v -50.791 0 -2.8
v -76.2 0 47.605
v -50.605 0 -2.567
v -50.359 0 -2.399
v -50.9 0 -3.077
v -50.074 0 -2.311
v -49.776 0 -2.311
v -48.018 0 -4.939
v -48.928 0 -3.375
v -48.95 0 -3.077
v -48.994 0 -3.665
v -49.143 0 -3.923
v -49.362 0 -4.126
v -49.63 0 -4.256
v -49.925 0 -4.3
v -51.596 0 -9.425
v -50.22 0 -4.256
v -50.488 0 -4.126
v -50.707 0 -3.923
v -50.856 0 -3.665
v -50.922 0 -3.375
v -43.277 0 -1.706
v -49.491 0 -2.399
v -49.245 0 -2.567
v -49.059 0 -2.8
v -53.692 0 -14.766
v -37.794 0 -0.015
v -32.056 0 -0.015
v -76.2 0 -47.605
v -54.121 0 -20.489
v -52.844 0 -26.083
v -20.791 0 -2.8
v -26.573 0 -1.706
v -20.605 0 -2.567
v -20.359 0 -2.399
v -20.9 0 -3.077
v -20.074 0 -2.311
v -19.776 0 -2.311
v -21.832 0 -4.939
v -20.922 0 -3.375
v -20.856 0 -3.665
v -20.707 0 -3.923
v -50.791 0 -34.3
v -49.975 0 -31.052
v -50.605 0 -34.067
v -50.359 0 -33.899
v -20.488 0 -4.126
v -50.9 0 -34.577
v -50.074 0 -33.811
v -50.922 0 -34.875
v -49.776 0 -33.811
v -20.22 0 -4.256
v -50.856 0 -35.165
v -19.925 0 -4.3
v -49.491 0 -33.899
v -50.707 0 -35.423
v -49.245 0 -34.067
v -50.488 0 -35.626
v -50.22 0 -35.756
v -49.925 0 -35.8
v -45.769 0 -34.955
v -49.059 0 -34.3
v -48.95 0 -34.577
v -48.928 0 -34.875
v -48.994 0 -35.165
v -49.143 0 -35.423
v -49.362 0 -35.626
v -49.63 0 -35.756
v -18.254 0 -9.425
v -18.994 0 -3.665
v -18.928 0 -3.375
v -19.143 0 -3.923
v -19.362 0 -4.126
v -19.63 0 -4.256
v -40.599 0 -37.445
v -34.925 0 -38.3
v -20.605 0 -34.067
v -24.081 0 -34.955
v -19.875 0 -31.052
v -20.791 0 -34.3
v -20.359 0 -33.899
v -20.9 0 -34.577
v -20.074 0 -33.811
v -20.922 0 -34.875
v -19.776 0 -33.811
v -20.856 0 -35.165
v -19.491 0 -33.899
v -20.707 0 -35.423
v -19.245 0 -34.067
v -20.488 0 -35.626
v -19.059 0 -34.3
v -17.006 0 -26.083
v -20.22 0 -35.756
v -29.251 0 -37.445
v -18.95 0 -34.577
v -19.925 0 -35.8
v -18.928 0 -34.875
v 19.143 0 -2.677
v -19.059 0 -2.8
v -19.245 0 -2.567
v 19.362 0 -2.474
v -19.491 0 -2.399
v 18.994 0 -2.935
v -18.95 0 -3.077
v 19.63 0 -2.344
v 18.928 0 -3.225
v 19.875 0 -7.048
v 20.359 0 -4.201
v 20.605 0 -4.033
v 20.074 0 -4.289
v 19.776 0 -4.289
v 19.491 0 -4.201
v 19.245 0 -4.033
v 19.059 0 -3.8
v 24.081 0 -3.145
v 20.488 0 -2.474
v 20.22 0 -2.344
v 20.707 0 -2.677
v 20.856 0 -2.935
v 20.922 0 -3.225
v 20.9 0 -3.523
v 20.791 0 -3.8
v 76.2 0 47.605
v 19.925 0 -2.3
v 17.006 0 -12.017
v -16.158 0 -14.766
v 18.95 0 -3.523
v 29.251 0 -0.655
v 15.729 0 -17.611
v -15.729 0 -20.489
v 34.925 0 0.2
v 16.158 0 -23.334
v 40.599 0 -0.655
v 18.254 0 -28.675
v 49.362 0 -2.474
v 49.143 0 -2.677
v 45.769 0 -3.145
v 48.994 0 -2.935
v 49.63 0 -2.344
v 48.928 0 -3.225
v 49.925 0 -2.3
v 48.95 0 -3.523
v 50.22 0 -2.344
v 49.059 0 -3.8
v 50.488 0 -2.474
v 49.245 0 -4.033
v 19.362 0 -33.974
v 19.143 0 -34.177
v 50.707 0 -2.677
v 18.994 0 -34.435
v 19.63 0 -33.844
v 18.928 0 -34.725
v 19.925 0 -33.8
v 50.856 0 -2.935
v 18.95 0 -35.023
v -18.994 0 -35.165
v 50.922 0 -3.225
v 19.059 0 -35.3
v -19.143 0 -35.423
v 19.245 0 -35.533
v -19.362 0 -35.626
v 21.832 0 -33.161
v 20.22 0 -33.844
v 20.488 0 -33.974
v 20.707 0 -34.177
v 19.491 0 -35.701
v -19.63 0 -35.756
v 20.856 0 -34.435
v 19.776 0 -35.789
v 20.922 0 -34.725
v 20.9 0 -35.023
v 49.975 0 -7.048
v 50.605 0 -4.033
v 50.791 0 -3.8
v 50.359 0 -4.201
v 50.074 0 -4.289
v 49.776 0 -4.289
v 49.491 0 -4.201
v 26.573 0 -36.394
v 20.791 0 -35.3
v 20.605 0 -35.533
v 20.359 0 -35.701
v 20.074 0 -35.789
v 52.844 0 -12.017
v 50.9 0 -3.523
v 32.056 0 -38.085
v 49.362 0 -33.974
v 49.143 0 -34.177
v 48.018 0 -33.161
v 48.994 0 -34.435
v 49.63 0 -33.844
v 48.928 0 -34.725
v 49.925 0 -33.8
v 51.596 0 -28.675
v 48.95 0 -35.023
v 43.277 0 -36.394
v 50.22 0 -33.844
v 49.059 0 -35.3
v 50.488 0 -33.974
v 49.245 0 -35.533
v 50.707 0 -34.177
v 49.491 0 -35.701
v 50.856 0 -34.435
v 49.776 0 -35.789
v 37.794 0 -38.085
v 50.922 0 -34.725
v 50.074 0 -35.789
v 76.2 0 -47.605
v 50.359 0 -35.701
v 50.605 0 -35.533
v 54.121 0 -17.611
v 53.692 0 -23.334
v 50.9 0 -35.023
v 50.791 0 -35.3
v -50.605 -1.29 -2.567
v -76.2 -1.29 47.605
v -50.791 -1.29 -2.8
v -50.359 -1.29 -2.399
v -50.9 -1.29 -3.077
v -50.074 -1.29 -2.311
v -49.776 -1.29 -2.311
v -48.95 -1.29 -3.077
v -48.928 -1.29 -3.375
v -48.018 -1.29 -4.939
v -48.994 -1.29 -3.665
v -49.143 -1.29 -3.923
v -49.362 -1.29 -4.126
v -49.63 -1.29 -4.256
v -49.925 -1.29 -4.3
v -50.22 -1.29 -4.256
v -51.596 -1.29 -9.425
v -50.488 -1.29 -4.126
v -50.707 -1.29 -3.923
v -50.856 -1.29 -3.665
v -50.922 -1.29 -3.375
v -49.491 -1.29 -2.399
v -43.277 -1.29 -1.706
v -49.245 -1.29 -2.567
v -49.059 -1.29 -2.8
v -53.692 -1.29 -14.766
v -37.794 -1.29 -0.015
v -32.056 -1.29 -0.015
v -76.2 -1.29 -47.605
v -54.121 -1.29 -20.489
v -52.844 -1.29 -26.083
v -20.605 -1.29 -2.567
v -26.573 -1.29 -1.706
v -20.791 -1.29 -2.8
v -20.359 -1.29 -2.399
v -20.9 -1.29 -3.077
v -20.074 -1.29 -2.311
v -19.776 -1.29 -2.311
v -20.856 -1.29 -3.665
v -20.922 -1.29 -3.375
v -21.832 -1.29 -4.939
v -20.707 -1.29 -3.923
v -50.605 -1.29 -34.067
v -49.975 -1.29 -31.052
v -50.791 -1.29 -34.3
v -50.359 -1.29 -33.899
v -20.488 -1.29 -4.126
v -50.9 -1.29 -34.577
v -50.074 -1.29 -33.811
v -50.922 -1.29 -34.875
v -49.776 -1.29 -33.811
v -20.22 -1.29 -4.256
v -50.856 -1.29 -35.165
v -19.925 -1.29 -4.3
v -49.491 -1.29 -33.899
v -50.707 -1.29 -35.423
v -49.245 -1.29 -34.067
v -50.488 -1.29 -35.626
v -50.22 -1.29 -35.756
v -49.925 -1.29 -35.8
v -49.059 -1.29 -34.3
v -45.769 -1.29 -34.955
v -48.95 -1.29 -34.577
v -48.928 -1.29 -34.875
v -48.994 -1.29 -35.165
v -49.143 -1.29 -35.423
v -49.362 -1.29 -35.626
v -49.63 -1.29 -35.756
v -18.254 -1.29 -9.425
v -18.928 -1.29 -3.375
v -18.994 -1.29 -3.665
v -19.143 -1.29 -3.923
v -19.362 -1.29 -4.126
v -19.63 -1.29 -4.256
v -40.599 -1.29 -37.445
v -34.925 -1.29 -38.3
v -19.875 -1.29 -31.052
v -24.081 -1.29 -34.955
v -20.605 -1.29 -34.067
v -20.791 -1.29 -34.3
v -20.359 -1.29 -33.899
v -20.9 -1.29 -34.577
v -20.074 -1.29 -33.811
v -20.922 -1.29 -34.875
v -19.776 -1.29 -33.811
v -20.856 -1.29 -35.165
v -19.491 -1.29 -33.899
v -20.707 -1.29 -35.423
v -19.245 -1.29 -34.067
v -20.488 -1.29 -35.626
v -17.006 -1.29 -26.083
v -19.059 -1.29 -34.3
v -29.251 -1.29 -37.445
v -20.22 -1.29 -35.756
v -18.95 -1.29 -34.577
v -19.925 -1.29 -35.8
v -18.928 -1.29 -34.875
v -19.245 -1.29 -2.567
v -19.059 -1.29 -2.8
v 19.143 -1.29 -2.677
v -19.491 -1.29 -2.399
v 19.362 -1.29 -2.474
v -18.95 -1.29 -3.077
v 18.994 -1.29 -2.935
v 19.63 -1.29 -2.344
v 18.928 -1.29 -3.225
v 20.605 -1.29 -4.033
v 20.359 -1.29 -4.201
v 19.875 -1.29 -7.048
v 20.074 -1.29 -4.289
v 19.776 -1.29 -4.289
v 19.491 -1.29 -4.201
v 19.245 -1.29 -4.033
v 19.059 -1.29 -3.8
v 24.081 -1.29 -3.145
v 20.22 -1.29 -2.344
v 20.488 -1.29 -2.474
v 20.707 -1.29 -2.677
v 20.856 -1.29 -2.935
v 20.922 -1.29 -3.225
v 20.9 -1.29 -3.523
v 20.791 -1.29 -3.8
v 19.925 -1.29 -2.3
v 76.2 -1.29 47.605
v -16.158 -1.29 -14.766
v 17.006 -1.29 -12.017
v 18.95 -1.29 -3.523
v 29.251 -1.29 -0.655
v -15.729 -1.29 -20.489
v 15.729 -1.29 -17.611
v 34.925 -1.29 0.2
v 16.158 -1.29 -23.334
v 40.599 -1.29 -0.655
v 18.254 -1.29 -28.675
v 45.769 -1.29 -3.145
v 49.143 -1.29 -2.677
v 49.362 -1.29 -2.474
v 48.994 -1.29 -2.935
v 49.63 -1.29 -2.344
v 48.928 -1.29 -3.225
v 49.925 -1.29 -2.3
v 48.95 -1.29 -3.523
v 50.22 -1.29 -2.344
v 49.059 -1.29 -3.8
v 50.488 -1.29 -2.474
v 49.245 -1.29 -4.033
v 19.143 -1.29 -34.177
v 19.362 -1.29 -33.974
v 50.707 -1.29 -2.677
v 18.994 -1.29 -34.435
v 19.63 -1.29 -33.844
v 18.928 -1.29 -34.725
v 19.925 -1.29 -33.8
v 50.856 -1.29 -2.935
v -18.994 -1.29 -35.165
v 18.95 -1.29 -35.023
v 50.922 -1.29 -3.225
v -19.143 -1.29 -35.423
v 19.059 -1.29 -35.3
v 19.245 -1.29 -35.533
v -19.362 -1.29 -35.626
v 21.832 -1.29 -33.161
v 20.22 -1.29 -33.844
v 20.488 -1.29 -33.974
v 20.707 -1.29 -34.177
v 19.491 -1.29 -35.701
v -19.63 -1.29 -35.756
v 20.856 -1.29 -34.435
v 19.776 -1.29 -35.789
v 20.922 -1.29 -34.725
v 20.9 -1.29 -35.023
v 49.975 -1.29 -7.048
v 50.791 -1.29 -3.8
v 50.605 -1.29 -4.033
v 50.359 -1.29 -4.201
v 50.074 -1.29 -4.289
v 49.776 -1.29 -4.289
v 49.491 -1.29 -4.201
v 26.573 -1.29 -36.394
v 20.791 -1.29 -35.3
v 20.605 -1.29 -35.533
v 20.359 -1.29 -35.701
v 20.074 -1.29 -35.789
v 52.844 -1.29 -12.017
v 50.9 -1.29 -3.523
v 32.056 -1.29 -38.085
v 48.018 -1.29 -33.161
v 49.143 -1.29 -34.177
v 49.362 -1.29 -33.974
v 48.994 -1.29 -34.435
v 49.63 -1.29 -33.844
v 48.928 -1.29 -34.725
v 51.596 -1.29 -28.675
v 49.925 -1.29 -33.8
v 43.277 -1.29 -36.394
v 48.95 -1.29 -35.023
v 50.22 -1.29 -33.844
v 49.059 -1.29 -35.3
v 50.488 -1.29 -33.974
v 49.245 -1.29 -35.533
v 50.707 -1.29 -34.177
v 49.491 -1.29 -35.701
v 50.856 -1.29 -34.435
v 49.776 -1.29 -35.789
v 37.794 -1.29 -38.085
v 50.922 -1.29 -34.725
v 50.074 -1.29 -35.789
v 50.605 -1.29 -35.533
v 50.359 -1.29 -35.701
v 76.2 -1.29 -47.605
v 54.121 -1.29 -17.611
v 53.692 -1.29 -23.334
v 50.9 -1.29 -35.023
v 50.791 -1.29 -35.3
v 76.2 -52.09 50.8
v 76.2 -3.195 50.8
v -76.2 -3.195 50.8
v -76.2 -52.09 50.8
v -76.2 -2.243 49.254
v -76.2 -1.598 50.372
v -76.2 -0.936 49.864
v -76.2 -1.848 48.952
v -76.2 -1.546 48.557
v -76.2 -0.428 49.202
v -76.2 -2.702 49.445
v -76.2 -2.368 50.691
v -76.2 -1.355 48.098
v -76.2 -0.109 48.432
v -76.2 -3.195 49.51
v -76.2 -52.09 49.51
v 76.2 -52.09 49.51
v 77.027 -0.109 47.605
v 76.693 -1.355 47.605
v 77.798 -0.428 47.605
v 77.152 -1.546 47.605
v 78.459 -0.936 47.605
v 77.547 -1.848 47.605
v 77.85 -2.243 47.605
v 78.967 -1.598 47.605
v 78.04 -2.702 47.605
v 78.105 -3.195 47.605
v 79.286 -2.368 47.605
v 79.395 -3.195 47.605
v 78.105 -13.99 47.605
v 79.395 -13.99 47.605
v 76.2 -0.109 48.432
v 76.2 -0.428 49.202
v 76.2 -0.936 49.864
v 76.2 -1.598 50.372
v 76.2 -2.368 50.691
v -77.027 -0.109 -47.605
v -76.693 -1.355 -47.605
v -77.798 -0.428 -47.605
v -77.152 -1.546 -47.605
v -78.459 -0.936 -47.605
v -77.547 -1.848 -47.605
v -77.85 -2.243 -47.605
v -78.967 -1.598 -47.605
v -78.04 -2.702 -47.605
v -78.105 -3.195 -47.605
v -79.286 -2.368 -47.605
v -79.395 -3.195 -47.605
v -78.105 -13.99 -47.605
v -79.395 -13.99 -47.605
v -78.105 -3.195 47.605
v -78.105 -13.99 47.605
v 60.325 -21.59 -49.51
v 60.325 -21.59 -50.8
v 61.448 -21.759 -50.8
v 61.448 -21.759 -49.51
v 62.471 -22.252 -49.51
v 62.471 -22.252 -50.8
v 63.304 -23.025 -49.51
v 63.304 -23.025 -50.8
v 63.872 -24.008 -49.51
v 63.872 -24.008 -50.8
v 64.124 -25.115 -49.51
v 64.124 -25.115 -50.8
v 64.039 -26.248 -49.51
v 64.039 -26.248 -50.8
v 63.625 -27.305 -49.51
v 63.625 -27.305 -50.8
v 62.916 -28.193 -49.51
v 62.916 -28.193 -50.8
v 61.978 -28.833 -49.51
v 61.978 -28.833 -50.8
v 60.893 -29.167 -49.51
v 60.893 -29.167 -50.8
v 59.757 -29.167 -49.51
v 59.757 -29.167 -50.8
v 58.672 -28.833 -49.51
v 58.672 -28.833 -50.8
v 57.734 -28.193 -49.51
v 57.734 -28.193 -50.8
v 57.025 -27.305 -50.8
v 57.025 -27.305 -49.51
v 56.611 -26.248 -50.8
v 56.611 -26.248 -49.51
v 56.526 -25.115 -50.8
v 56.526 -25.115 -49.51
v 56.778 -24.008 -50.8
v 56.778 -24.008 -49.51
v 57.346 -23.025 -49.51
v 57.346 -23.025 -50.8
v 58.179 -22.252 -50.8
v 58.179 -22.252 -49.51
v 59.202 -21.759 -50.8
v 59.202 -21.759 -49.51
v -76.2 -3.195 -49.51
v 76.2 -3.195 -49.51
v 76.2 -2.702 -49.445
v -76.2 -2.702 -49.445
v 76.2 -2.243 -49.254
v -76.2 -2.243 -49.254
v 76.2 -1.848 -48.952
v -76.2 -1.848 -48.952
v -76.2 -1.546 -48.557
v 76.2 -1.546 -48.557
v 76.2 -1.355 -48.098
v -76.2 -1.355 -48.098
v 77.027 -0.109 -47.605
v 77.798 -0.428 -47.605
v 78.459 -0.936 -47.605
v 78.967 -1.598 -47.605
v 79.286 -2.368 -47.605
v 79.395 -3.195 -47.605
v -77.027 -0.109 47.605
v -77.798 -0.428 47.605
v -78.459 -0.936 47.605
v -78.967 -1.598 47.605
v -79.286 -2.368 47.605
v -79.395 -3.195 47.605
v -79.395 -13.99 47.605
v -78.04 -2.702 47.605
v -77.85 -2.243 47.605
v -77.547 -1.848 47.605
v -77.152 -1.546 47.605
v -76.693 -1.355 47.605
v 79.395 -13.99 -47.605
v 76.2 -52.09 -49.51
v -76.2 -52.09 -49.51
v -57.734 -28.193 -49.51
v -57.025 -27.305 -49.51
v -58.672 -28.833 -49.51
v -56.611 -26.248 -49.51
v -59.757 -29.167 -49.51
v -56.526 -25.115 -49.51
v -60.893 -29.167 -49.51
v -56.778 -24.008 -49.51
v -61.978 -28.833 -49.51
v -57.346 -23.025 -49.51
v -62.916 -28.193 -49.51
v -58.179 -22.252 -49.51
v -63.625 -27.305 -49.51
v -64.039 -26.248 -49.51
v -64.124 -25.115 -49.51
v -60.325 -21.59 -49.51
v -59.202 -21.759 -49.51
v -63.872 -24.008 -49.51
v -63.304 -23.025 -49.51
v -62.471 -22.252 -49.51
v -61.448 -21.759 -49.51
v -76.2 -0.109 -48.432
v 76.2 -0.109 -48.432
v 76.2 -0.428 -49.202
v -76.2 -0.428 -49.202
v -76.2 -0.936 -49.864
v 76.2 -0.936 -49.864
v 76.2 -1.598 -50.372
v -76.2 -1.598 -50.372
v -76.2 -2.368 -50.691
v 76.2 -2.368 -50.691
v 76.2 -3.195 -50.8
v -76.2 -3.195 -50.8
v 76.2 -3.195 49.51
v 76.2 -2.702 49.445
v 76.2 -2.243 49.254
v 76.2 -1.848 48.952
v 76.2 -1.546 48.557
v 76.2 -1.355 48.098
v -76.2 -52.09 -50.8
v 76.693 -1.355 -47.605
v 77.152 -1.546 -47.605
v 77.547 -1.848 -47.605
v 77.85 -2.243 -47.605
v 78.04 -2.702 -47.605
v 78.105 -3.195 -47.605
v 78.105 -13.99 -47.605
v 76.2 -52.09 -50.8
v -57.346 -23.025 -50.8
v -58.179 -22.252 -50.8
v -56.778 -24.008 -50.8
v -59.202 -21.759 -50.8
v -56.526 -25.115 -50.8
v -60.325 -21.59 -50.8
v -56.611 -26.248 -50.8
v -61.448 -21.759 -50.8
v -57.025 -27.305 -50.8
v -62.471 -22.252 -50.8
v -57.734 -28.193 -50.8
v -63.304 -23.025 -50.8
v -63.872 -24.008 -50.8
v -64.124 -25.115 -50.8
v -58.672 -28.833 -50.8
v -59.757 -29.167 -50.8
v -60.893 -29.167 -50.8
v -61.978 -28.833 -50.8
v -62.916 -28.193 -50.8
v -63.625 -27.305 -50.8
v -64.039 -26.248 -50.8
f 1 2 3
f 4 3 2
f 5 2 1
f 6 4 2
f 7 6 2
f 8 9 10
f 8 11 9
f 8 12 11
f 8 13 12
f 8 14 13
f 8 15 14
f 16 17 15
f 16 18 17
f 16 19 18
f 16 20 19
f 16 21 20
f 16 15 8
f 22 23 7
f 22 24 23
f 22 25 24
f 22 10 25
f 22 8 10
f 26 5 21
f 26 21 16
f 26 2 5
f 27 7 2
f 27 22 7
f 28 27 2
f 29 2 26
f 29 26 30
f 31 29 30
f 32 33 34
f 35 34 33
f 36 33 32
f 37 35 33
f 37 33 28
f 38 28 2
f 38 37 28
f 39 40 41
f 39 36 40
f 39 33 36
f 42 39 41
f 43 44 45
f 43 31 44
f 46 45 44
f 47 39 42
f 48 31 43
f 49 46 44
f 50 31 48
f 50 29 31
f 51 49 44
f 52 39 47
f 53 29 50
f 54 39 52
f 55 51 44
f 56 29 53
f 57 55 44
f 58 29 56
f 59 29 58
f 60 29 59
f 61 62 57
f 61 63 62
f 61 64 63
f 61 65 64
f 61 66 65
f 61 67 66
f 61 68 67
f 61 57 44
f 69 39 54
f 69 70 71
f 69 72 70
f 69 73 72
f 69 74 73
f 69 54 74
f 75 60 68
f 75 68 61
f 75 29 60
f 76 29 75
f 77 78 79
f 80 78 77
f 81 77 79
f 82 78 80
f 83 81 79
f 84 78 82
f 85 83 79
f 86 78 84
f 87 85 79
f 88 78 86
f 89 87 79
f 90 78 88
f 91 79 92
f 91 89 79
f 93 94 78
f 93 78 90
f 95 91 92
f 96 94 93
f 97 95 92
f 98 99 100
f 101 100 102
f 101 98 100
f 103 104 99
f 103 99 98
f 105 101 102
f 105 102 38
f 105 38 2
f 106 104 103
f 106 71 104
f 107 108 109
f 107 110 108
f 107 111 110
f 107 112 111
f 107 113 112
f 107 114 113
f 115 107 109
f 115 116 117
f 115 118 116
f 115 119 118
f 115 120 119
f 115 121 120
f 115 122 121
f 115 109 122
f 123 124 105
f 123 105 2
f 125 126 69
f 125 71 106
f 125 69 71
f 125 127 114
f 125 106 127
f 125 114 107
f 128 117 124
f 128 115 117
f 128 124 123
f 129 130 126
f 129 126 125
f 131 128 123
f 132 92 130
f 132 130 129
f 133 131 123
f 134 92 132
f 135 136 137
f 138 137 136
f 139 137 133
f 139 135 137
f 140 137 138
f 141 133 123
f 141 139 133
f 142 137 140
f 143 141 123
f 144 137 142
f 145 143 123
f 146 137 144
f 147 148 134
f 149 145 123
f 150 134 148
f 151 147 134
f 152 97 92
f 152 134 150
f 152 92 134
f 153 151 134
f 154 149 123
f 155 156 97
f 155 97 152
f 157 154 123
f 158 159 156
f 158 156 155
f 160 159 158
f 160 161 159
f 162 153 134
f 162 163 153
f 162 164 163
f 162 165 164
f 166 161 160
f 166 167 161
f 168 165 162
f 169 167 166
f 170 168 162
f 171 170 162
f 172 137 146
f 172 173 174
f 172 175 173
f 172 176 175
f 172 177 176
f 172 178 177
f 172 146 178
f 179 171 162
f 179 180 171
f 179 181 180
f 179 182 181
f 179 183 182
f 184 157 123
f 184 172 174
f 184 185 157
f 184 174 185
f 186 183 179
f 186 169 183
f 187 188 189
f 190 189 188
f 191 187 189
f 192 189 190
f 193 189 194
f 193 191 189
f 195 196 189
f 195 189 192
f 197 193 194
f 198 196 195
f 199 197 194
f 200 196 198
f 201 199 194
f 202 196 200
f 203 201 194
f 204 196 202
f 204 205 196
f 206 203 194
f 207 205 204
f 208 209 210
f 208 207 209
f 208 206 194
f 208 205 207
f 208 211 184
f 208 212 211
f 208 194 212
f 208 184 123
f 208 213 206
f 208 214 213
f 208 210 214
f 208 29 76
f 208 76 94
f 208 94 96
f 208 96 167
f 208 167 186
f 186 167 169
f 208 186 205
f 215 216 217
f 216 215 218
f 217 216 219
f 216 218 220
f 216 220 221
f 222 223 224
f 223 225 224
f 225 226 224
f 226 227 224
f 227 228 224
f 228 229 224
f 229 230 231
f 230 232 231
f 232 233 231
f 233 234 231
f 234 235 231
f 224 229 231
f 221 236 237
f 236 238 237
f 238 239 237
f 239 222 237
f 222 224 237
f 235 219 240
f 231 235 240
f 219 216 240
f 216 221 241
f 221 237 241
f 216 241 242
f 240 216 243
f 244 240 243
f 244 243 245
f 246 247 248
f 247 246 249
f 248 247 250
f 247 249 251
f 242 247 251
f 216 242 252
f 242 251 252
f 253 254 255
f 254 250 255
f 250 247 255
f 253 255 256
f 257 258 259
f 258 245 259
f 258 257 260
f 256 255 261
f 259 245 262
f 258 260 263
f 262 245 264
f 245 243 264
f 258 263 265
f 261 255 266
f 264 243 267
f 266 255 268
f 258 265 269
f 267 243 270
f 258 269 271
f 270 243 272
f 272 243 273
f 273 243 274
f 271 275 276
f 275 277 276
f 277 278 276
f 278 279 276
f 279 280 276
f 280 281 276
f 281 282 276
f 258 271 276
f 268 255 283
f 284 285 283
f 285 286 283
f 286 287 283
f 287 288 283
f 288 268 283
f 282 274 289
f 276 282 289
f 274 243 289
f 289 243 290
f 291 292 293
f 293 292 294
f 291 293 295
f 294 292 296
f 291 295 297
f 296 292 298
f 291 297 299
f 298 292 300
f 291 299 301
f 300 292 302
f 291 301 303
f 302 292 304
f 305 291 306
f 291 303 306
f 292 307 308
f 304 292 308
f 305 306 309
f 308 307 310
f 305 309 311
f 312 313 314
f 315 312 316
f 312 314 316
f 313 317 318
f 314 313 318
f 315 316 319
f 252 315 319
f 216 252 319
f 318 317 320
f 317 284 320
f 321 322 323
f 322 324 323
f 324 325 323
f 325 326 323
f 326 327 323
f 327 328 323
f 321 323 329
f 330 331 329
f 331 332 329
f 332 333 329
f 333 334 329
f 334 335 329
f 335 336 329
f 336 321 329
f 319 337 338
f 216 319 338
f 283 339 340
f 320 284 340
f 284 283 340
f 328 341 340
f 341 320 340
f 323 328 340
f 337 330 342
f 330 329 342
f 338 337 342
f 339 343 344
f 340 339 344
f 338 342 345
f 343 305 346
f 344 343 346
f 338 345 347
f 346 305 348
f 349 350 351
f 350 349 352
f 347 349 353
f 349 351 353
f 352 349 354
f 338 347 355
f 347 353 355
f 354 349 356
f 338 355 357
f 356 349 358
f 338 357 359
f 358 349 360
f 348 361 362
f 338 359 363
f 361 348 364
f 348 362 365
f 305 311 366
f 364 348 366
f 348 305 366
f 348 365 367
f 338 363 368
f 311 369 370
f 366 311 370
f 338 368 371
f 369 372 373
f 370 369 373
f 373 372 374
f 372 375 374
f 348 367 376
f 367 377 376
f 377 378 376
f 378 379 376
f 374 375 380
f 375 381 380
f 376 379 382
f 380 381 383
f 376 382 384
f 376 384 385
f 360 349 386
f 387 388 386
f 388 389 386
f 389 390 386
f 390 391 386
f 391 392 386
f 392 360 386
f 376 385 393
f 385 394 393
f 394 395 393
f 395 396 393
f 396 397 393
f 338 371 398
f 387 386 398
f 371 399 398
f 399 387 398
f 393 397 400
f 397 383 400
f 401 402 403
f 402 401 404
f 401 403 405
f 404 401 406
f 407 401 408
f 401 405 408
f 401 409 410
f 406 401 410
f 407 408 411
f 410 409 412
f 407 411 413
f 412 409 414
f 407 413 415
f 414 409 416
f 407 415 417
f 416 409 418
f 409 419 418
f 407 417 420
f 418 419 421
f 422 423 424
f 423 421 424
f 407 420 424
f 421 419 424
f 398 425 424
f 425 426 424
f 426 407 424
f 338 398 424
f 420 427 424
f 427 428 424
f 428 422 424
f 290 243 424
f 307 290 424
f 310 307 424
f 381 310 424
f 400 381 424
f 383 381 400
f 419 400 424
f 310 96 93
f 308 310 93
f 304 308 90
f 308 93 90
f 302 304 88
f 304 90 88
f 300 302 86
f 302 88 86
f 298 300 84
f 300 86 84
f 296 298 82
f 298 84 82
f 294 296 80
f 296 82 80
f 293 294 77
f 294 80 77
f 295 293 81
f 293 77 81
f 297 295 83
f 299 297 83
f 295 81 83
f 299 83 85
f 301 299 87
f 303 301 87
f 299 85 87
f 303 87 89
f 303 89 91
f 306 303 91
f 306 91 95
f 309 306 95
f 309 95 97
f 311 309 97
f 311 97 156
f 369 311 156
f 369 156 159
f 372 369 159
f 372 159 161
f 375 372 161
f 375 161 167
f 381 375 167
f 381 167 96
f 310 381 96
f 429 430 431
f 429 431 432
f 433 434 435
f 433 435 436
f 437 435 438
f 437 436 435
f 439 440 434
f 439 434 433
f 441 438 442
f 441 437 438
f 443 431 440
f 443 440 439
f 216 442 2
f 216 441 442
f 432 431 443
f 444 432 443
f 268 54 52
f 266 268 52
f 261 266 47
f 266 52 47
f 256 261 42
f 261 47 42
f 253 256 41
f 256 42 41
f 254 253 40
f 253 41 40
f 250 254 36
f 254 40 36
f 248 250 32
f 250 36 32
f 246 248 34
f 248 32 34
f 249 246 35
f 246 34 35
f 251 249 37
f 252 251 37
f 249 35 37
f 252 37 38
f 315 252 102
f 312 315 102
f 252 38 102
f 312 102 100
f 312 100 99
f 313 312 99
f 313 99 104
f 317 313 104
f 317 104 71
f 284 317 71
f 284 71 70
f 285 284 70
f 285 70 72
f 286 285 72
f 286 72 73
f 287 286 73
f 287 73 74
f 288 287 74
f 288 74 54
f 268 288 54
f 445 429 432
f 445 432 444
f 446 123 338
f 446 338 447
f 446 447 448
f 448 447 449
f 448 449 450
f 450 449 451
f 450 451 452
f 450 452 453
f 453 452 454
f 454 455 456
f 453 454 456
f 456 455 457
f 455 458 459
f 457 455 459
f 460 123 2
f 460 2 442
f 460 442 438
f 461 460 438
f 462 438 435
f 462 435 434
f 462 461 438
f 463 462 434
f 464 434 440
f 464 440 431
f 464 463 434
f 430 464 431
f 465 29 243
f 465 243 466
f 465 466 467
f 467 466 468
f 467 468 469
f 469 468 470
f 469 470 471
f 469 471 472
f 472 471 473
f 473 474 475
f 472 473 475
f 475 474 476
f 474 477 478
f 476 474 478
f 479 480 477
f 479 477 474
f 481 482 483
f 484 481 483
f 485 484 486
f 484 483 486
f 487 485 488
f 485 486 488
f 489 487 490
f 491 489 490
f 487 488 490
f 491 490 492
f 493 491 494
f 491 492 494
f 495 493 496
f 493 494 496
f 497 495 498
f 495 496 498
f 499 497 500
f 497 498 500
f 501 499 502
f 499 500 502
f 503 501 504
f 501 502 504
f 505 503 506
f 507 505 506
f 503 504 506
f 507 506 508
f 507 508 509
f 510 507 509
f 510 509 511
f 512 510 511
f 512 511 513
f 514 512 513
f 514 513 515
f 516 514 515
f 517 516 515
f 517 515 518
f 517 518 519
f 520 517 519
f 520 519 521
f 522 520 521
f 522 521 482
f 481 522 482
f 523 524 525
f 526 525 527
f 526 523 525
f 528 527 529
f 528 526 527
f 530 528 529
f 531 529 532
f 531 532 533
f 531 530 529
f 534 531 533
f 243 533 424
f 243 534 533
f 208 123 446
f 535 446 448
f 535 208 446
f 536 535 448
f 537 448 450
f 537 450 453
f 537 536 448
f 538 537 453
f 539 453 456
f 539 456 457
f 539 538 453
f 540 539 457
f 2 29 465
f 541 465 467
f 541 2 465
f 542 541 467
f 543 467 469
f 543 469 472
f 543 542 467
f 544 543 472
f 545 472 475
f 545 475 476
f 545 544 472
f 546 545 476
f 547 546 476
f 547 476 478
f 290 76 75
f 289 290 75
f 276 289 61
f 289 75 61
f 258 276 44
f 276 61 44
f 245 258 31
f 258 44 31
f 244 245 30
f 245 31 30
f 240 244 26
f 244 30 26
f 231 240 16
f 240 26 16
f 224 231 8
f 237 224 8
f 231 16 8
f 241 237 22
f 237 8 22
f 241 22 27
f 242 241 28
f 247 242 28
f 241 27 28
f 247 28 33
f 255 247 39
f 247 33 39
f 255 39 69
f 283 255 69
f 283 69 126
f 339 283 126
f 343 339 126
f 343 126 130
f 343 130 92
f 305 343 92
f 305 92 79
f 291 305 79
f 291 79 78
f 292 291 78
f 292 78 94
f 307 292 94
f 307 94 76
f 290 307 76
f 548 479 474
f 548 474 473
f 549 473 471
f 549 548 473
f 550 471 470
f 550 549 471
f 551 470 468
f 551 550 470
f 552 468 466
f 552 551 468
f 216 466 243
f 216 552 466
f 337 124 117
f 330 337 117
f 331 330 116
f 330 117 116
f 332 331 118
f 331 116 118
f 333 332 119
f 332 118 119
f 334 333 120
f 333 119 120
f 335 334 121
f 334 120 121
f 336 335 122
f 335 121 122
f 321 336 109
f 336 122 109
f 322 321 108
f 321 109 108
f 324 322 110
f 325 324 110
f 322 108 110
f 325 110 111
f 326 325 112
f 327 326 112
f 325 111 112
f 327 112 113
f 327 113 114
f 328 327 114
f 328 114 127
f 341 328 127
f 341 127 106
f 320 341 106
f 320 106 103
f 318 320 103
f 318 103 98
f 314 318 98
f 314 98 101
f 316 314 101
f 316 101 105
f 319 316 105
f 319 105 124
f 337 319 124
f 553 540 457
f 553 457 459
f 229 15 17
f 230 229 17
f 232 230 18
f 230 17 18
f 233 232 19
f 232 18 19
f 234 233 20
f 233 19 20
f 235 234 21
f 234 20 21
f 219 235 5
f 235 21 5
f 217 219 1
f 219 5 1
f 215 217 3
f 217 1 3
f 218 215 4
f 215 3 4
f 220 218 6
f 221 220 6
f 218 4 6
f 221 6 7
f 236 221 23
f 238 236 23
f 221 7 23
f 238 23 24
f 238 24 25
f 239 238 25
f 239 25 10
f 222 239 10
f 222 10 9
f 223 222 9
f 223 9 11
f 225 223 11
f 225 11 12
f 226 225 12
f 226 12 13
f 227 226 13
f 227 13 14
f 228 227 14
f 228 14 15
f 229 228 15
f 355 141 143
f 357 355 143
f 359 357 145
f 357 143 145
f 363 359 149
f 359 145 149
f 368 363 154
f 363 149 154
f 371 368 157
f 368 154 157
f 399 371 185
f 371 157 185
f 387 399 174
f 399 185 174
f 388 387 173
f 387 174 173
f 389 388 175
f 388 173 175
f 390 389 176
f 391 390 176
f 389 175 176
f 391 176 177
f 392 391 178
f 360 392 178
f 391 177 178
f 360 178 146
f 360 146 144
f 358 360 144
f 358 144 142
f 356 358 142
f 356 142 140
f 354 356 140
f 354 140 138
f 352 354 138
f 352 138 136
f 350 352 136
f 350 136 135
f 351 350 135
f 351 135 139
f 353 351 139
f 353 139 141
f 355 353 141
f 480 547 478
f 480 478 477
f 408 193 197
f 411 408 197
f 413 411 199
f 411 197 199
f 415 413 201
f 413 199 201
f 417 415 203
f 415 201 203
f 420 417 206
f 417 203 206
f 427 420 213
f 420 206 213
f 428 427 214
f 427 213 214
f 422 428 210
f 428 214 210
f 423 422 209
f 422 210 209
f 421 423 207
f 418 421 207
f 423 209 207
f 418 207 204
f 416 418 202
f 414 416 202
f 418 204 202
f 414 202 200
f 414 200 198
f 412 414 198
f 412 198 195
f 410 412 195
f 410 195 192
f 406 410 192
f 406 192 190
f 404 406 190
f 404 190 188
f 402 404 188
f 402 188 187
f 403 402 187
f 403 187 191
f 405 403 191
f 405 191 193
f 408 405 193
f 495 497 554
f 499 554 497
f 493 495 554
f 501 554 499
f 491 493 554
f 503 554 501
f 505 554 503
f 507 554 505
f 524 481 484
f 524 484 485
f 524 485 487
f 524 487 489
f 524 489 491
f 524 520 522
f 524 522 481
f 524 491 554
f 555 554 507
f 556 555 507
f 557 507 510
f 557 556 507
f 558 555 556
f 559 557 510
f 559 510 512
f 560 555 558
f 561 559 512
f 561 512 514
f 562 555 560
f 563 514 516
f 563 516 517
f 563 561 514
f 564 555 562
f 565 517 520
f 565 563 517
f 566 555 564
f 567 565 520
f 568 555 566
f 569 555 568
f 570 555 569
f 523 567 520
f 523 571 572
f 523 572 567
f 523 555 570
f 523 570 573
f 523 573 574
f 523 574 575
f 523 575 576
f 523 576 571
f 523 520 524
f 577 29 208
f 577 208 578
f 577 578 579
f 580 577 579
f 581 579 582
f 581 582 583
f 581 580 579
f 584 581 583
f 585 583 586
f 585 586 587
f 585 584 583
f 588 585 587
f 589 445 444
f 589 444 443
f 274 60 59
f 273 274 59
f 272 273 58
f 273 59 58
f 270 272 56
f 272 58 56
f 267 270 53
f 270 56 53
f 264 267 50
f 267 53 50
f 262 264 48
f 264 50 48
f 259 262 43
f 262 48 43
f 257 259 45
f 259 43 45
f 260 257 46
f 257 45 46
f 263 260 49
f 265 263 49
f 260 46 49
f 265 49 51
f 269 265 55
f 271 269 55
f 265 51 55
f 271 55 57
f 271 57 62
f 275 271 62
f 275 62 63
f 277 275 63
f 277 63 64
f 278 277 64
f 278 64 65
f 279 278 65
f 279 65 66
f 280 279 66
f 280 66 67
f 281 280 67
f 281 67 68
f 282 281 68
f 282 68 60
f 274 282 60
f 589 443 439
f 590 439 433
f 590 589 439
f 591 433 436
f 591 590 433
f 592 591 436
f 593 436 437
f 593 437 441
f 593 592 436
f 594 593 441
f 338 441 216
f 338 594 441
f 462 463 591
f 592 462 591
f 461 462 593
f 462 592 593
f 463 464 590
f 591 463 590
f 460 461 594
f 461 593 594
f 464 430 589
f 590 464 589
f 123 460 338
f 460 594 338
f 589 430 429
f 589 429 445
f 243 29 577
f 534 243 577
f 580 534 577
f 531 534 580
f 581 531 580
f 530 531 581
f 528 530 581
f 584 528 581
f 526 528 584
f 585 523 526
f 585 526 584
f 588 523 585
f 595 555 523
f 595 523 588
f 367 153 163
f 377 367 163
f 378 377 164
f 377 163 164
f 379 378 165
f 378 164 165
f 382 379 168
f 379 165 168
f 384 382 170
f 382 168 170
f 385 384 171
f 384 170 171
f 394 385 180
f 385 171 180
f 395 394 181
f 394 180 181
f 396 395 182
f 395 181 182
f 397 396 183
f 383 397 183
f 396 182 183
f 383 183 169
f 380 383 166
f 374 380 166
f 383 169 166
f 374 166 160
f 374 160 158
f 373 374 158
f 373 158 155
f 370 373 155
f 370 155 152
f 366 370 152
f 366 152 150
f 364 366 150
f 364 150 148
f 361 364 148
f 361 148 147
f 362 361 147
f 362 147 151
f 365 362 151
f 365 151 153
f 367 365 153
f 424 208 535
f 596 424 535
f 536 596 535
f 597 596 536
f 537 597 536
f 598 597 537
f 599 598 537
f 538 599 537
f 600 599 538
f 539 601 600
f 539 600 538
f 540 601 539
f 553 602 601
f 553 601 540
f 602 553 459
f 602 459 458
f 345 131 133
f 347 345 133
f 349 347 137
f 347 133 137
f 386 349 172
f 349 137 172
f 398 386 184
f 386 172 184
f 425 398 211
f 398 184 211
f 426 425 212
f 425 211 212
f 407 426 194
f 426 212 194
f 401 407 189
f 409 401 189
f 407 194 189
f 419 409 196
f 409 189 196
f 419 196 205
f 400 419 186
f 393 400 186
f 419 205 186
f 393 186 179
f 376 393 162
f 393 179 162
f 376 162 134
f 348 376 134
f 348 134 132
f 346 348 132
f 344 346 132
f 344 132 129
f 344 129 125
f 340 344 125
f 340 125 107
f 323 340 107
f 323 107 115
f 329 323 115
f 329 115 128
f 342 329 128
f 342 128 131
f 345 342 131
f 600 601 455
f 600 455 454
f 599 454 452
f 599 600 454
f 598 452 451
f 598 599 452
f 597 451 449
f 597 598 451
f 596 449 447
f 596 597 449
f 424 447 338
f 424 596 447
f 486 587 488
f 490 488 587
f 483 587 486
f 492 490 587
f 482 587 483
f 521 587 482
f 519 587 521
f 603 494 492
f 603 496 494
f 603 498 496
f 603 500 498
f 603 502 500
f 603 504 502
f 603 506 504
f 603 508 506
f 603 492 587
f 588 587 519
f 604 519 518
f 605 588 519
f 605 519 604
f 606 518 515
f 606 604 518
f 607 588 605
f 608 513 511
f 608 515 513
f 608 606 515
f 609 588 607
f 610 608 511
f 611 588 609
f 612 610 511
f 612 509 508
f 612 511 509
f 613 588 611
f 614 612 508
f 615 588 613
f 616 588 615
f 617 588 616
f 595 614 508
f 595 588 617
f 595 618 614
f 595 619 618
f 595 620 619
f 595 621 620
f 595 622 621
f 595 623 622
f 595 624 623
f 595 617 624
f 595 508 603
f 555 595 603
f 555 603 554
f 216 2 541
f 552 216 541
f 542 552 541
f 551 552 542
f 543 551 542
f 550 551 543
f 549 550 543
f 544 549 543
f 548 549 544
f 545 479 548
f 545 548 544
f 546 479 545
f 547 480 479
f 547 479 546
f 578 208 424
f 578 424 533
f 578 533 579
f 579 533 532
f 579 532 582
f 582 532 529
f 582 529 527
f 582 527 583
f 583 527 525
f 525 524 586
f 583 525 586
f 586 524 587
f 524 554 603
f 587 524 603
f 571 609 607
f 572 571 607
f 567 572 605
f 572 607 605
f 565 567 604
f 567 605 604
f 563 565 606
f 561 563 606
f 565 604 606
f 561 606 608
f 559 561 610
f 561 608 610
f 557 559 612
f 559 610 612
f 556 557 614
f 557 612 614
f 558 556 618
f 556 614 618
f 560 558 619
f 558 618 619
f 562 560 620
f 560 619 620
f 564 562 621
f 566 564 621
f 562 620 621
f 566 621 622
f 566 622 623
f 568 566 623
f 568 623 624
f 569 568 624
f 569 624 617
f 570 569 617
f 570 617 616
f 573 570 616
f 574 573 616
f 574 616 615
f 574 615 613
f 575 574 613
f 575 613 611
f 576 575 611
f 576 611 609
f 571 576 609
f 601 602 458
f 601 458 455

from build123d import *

# Parameters (mm, degrees)
SKETCH1_W                      = 152.4
SKETCH1_H                      = 101.6
BASE_FLANGE1_DEPTH             = 1.29032
EDGE_FLANGE1_STRIP_W           = 8.97128
EDGE_FLANGE1_STRIP_H           = 1.29032
EDGE_FLANGE1_STRIP_CUT_DEPTH   = 152.4
EDGE_FLANGE1_STRIP_2_W         = 8.97128
EDGE_FLANGE1_STRIP_2_H         = 1.29032
EDGE_FLANGE1_STRIP_CUT_2_DEPTH = 152.4
EDGE_FLANGE1_DEPTH             = 152.4
EDGE_FLANGE1_BEND_DEPTH        = 152.4
EDGE_FLANGE2_DEPTH             = 95.20936
EDGE_FLANGE2_BEND_DEPTH        = 95.20936
SKETCH22_R                     = 19.249999981
SKETCH22_R_2                   = 1
CUT_EXTRUDE1_DEPTH             = 2.54
CUT_EXTRUDE2_REACH             = 141.067
SKETCH23_R                     = 3.81


# Sheet-metal steps are written as plain solids
with BuildPart() as part:
    # Sketch1 → Base-Flange1 (new body)
    with BuildSketch(Plane(origin=(0, 0, 0), x_dir=(1, 0, 0), z_dir=(0, 1, 0))):
        Rectangle(SKETCH1_W, SKETCH1_H)
    extrude(amount=-BASE_FLANGE1_DEPTH)

    # Edge-Flange1 strip (across the edge) → Edge-Flange1 strip cut (cut)
    with BuildSketch(Plane(origin=(76.2, -1.29032, 50.8), x_dir=(0, 0, -1), z_dir=(-1, 0, 0))):
        with Locations((-1.29032, -0.64516)):
            Rectangle(EDGE_FLANGE1_STRIP_W, EDGE_FLANGE1_STRIP_H)
    extrude(amount=EDGE_FLANGE1_STRIP_CUT_DEPTH, mode=Mode.SUBTRACT)

    # Edge-Flange1 strip 2 (across the edge) → Edge-Flange1 strip cut 2 (cut)
    with BuildSketch(Plane(origin=(-76.2, -1.29032, -50.8), x_dir=(0, 0, 1), z_dir=(1, 0, 0))):
        with Locations((-1.29032, -0.64516)):
            Rectangle(EDGE_FLANGE1_STRIP_2_W, EDGE_FLANGE1_STRIP_2_H)
    extrude(amount=EDGE_FLANGE1_STRIP_CUT_2_DEPTH, mode=Mode.SUBTRACT)

    # Edge-Flange1 section (across the edge) → Edge-Flange1 (add)
    with BuildSketch(Plane(origin=(76.2, -1.29032, 50.8), x_dir=(0, 0, -1), z_dir=(-1, 0, 0))):
        with BuildLine():
            Line((0, 1.905), (0, 50.8))
            Line((0, 50.8), (1.29032, 50.8))
            Line((1.29032, 50.8), (1.29032, 1.905))
            ThreePointArc((1.29032, 1.905), (1.848281582, 0.557961582), (3.19532, 0))
            Line((3.19532, 0), (3.19532, -1.29032))
            ThreePointArc((3.19532, -1.29032), (0.93588756, -0.35443244), (0, 1.905))
        make_face()
    extrude(amount=EDGE_FLANGE1_DEPTH)

    # Edge-Flange1 section 2 (across the edge) → Edge-Flange1 bend (add)
    with BuildSketch(Plane(origin=(-76.2, -1.29032, -50.8), x_dir=(0, 0, 1), z_dir=(1, 0, 0))):
        with BuildLine():
            Line((0, 1.905), (0, 50.8))
            Line((0, 50.8), (1.29032, 50.8))
            Line((1.29032, 50.8), (1.29032, 1.905))
            ThreePointArc((1.29032, 1.905), (1.848281582, 0.557961582), (3.19532, 0))
            Line((3.19532, 0), (3.19532, -1.29032))
            ThreePointArc((3.19532, -1.29032), (0.93588756, -0.35443244), (0, 1.905))
        make_face()
    extrude(amount=EDGE_FLANGE1_BEND_DEPTH)

    # Edge-Flange2 section (across the edge) → Edge-Flange2 (add)
    with BuildSketch(Plane(origin=(-78.105, -1.29032, 47.60468), x_dir=(1, 0, 0), z_dir=(0, 0, -1))):
        with BuildLine():
            Line((-1.29032, 1.905), (-1.29032, 12.7))
            Line((-1.29032, 12.7), (0, 12.7))
            Line((0, 12.7), (0, 1.905))
            ThreePointArc((0, 1.905), (0.557961582, 0.557961582), (1.905, 0))
            Line((1.905, 0), (1.905, -1.29032))
            ThreePointArc((1.905, -1.29032), (-0.35443244, -0.35443244), (-1.29032, 1.905))
        make_face()
    extrude(amount=EDGE_FLANGE2_DEPTH)

    # Edge-Flange2 section 2 (across the edge) → Edge-Flange2 bend (add)
    with BuildSketch(Plane(origin=(78.105, -1.29032, -47.60468), x_dir=(-1, 0, 0), z_dir=(0, 0, 1))):
        with BuildLine():
            Line((-1.29032, 1.905), (-1.29032, 12.7))
            Line((-1.29032, 12.7), (0, 12.7))
            Line((0, 12.7), (0, 1.905))
            ThreePointArc((0, 1.905), (0.557961582, 0.557961582), (1.905, 0))
            Line((1.905, 0), (1.905, -1.29032))
            ThreePointArc((1.905, -1.29032), (-0.35443244, -0.35443244), (-1.29032, 1.905))
        make_face()
    extrude(amount=EDGE_FLANGE2_BEND_DEPTH)

    # Sketch22 → Cut-Extrude1 (cut)
    with BuildSketch(Plane(origin=(0, 0, 0), x_dir=(1, 0, 0), z_dir=(0, 1, 0))):
        with Locations(Location((34.925, 19.05, 0), (0, 0, 270))):
            Circle(SKETCH22_R)
        with Locations(Location((19.925, 34.8, 0), (0, 0, 270))):
            Circle(SKETCH22_R_2)
        with Locations(Location((49.925, 34.8, 0), (0, 0, 270))):
            Circle(SKETCH22_R_2)
        with Locations(Location((49.925, 3.3, 0), (0, 0, 270))):
            Circle(SKETCH22_R_2)
        with Locations(Location((19.925, 3.3, 0), (0, 0, 270))):
            Circle(SKETCH22_R_2)
        with Locations(Location((-19.925, 3.3, 0), (0, 0, 90))):
            Circle(SKETCH22_R_2)
        with Locations(Location((-49.925, 3.3, 0), (0, 0, 90))):
            Circle(SKETCH22_R_2)
        with Locations(Location((-49.925, 34.8, 0), (0, 0, 90))):
            Circle(SKETCH22_R_2)
        with Locations(Location((-19.925, 34.8, 0), (0, 0, 90))):
            Circle(SKETCH22_R_2)
        with Locations(Location((-34.925, 19.05, 0), (0, 0, 90))):
            Circle(SKETCH22_R)
    extrude(amount=-CUT_EXTRUDE1_DEPTH, mode=Mode.SUBTRACT)

    # Sketch23 → Cut-Extrude2 (cut, up to next)
    with BuildSketch(Plane(origin=(0, 0, -50.8), x_dir=(-1, 0, 0), z_dir=(0, 0, -1)), mode=Mode.PRIVATE) as cut_extrude2_sk1:
        with Locations(Location((60.325, -25.4, 0), (0, 0, 90))):
            Circle(SKETCH23_R)
    cut_extrude2_tool1 = extrude(cut_extrude2_sk1.sketch, amount=-CUT_EXTRUDE2_REACH, mode=Mode.PRIVATE) & part.part
    # Sketch23 → Cut-Extrude2 (cut, up to next)
    with BuildSketch(Plane(origin=(0, 0, -50.8), x_dir=(-1, 0, 0), z_dir=(0, 0, -1)), mode=Mode.PRIVATE) as cut_extrude2_sk2:
        with Locations(Location((-60.325, -25.4, 0), (0, 0, 90))):
            Circle(SKETCH23_R)
    cut_extrude2_tool2 = extrude(cut_extrude2_sk2.sketch, amount=-CUT_EXTRUDE2_REACH, mode=Mode.PRIVATE) & part.part
    add(cut_extrude2_tool1.solids().sort_by_distance((-60.325, -25.4, -50.8))[0], mode=Mode.SUBTRACT)
    add(cut_extrude2_tool2.solids().sort_by_distance((60.325, -25.4, -50.8))[0], mode=Mode.SUBTRACT)


solid = part.part
